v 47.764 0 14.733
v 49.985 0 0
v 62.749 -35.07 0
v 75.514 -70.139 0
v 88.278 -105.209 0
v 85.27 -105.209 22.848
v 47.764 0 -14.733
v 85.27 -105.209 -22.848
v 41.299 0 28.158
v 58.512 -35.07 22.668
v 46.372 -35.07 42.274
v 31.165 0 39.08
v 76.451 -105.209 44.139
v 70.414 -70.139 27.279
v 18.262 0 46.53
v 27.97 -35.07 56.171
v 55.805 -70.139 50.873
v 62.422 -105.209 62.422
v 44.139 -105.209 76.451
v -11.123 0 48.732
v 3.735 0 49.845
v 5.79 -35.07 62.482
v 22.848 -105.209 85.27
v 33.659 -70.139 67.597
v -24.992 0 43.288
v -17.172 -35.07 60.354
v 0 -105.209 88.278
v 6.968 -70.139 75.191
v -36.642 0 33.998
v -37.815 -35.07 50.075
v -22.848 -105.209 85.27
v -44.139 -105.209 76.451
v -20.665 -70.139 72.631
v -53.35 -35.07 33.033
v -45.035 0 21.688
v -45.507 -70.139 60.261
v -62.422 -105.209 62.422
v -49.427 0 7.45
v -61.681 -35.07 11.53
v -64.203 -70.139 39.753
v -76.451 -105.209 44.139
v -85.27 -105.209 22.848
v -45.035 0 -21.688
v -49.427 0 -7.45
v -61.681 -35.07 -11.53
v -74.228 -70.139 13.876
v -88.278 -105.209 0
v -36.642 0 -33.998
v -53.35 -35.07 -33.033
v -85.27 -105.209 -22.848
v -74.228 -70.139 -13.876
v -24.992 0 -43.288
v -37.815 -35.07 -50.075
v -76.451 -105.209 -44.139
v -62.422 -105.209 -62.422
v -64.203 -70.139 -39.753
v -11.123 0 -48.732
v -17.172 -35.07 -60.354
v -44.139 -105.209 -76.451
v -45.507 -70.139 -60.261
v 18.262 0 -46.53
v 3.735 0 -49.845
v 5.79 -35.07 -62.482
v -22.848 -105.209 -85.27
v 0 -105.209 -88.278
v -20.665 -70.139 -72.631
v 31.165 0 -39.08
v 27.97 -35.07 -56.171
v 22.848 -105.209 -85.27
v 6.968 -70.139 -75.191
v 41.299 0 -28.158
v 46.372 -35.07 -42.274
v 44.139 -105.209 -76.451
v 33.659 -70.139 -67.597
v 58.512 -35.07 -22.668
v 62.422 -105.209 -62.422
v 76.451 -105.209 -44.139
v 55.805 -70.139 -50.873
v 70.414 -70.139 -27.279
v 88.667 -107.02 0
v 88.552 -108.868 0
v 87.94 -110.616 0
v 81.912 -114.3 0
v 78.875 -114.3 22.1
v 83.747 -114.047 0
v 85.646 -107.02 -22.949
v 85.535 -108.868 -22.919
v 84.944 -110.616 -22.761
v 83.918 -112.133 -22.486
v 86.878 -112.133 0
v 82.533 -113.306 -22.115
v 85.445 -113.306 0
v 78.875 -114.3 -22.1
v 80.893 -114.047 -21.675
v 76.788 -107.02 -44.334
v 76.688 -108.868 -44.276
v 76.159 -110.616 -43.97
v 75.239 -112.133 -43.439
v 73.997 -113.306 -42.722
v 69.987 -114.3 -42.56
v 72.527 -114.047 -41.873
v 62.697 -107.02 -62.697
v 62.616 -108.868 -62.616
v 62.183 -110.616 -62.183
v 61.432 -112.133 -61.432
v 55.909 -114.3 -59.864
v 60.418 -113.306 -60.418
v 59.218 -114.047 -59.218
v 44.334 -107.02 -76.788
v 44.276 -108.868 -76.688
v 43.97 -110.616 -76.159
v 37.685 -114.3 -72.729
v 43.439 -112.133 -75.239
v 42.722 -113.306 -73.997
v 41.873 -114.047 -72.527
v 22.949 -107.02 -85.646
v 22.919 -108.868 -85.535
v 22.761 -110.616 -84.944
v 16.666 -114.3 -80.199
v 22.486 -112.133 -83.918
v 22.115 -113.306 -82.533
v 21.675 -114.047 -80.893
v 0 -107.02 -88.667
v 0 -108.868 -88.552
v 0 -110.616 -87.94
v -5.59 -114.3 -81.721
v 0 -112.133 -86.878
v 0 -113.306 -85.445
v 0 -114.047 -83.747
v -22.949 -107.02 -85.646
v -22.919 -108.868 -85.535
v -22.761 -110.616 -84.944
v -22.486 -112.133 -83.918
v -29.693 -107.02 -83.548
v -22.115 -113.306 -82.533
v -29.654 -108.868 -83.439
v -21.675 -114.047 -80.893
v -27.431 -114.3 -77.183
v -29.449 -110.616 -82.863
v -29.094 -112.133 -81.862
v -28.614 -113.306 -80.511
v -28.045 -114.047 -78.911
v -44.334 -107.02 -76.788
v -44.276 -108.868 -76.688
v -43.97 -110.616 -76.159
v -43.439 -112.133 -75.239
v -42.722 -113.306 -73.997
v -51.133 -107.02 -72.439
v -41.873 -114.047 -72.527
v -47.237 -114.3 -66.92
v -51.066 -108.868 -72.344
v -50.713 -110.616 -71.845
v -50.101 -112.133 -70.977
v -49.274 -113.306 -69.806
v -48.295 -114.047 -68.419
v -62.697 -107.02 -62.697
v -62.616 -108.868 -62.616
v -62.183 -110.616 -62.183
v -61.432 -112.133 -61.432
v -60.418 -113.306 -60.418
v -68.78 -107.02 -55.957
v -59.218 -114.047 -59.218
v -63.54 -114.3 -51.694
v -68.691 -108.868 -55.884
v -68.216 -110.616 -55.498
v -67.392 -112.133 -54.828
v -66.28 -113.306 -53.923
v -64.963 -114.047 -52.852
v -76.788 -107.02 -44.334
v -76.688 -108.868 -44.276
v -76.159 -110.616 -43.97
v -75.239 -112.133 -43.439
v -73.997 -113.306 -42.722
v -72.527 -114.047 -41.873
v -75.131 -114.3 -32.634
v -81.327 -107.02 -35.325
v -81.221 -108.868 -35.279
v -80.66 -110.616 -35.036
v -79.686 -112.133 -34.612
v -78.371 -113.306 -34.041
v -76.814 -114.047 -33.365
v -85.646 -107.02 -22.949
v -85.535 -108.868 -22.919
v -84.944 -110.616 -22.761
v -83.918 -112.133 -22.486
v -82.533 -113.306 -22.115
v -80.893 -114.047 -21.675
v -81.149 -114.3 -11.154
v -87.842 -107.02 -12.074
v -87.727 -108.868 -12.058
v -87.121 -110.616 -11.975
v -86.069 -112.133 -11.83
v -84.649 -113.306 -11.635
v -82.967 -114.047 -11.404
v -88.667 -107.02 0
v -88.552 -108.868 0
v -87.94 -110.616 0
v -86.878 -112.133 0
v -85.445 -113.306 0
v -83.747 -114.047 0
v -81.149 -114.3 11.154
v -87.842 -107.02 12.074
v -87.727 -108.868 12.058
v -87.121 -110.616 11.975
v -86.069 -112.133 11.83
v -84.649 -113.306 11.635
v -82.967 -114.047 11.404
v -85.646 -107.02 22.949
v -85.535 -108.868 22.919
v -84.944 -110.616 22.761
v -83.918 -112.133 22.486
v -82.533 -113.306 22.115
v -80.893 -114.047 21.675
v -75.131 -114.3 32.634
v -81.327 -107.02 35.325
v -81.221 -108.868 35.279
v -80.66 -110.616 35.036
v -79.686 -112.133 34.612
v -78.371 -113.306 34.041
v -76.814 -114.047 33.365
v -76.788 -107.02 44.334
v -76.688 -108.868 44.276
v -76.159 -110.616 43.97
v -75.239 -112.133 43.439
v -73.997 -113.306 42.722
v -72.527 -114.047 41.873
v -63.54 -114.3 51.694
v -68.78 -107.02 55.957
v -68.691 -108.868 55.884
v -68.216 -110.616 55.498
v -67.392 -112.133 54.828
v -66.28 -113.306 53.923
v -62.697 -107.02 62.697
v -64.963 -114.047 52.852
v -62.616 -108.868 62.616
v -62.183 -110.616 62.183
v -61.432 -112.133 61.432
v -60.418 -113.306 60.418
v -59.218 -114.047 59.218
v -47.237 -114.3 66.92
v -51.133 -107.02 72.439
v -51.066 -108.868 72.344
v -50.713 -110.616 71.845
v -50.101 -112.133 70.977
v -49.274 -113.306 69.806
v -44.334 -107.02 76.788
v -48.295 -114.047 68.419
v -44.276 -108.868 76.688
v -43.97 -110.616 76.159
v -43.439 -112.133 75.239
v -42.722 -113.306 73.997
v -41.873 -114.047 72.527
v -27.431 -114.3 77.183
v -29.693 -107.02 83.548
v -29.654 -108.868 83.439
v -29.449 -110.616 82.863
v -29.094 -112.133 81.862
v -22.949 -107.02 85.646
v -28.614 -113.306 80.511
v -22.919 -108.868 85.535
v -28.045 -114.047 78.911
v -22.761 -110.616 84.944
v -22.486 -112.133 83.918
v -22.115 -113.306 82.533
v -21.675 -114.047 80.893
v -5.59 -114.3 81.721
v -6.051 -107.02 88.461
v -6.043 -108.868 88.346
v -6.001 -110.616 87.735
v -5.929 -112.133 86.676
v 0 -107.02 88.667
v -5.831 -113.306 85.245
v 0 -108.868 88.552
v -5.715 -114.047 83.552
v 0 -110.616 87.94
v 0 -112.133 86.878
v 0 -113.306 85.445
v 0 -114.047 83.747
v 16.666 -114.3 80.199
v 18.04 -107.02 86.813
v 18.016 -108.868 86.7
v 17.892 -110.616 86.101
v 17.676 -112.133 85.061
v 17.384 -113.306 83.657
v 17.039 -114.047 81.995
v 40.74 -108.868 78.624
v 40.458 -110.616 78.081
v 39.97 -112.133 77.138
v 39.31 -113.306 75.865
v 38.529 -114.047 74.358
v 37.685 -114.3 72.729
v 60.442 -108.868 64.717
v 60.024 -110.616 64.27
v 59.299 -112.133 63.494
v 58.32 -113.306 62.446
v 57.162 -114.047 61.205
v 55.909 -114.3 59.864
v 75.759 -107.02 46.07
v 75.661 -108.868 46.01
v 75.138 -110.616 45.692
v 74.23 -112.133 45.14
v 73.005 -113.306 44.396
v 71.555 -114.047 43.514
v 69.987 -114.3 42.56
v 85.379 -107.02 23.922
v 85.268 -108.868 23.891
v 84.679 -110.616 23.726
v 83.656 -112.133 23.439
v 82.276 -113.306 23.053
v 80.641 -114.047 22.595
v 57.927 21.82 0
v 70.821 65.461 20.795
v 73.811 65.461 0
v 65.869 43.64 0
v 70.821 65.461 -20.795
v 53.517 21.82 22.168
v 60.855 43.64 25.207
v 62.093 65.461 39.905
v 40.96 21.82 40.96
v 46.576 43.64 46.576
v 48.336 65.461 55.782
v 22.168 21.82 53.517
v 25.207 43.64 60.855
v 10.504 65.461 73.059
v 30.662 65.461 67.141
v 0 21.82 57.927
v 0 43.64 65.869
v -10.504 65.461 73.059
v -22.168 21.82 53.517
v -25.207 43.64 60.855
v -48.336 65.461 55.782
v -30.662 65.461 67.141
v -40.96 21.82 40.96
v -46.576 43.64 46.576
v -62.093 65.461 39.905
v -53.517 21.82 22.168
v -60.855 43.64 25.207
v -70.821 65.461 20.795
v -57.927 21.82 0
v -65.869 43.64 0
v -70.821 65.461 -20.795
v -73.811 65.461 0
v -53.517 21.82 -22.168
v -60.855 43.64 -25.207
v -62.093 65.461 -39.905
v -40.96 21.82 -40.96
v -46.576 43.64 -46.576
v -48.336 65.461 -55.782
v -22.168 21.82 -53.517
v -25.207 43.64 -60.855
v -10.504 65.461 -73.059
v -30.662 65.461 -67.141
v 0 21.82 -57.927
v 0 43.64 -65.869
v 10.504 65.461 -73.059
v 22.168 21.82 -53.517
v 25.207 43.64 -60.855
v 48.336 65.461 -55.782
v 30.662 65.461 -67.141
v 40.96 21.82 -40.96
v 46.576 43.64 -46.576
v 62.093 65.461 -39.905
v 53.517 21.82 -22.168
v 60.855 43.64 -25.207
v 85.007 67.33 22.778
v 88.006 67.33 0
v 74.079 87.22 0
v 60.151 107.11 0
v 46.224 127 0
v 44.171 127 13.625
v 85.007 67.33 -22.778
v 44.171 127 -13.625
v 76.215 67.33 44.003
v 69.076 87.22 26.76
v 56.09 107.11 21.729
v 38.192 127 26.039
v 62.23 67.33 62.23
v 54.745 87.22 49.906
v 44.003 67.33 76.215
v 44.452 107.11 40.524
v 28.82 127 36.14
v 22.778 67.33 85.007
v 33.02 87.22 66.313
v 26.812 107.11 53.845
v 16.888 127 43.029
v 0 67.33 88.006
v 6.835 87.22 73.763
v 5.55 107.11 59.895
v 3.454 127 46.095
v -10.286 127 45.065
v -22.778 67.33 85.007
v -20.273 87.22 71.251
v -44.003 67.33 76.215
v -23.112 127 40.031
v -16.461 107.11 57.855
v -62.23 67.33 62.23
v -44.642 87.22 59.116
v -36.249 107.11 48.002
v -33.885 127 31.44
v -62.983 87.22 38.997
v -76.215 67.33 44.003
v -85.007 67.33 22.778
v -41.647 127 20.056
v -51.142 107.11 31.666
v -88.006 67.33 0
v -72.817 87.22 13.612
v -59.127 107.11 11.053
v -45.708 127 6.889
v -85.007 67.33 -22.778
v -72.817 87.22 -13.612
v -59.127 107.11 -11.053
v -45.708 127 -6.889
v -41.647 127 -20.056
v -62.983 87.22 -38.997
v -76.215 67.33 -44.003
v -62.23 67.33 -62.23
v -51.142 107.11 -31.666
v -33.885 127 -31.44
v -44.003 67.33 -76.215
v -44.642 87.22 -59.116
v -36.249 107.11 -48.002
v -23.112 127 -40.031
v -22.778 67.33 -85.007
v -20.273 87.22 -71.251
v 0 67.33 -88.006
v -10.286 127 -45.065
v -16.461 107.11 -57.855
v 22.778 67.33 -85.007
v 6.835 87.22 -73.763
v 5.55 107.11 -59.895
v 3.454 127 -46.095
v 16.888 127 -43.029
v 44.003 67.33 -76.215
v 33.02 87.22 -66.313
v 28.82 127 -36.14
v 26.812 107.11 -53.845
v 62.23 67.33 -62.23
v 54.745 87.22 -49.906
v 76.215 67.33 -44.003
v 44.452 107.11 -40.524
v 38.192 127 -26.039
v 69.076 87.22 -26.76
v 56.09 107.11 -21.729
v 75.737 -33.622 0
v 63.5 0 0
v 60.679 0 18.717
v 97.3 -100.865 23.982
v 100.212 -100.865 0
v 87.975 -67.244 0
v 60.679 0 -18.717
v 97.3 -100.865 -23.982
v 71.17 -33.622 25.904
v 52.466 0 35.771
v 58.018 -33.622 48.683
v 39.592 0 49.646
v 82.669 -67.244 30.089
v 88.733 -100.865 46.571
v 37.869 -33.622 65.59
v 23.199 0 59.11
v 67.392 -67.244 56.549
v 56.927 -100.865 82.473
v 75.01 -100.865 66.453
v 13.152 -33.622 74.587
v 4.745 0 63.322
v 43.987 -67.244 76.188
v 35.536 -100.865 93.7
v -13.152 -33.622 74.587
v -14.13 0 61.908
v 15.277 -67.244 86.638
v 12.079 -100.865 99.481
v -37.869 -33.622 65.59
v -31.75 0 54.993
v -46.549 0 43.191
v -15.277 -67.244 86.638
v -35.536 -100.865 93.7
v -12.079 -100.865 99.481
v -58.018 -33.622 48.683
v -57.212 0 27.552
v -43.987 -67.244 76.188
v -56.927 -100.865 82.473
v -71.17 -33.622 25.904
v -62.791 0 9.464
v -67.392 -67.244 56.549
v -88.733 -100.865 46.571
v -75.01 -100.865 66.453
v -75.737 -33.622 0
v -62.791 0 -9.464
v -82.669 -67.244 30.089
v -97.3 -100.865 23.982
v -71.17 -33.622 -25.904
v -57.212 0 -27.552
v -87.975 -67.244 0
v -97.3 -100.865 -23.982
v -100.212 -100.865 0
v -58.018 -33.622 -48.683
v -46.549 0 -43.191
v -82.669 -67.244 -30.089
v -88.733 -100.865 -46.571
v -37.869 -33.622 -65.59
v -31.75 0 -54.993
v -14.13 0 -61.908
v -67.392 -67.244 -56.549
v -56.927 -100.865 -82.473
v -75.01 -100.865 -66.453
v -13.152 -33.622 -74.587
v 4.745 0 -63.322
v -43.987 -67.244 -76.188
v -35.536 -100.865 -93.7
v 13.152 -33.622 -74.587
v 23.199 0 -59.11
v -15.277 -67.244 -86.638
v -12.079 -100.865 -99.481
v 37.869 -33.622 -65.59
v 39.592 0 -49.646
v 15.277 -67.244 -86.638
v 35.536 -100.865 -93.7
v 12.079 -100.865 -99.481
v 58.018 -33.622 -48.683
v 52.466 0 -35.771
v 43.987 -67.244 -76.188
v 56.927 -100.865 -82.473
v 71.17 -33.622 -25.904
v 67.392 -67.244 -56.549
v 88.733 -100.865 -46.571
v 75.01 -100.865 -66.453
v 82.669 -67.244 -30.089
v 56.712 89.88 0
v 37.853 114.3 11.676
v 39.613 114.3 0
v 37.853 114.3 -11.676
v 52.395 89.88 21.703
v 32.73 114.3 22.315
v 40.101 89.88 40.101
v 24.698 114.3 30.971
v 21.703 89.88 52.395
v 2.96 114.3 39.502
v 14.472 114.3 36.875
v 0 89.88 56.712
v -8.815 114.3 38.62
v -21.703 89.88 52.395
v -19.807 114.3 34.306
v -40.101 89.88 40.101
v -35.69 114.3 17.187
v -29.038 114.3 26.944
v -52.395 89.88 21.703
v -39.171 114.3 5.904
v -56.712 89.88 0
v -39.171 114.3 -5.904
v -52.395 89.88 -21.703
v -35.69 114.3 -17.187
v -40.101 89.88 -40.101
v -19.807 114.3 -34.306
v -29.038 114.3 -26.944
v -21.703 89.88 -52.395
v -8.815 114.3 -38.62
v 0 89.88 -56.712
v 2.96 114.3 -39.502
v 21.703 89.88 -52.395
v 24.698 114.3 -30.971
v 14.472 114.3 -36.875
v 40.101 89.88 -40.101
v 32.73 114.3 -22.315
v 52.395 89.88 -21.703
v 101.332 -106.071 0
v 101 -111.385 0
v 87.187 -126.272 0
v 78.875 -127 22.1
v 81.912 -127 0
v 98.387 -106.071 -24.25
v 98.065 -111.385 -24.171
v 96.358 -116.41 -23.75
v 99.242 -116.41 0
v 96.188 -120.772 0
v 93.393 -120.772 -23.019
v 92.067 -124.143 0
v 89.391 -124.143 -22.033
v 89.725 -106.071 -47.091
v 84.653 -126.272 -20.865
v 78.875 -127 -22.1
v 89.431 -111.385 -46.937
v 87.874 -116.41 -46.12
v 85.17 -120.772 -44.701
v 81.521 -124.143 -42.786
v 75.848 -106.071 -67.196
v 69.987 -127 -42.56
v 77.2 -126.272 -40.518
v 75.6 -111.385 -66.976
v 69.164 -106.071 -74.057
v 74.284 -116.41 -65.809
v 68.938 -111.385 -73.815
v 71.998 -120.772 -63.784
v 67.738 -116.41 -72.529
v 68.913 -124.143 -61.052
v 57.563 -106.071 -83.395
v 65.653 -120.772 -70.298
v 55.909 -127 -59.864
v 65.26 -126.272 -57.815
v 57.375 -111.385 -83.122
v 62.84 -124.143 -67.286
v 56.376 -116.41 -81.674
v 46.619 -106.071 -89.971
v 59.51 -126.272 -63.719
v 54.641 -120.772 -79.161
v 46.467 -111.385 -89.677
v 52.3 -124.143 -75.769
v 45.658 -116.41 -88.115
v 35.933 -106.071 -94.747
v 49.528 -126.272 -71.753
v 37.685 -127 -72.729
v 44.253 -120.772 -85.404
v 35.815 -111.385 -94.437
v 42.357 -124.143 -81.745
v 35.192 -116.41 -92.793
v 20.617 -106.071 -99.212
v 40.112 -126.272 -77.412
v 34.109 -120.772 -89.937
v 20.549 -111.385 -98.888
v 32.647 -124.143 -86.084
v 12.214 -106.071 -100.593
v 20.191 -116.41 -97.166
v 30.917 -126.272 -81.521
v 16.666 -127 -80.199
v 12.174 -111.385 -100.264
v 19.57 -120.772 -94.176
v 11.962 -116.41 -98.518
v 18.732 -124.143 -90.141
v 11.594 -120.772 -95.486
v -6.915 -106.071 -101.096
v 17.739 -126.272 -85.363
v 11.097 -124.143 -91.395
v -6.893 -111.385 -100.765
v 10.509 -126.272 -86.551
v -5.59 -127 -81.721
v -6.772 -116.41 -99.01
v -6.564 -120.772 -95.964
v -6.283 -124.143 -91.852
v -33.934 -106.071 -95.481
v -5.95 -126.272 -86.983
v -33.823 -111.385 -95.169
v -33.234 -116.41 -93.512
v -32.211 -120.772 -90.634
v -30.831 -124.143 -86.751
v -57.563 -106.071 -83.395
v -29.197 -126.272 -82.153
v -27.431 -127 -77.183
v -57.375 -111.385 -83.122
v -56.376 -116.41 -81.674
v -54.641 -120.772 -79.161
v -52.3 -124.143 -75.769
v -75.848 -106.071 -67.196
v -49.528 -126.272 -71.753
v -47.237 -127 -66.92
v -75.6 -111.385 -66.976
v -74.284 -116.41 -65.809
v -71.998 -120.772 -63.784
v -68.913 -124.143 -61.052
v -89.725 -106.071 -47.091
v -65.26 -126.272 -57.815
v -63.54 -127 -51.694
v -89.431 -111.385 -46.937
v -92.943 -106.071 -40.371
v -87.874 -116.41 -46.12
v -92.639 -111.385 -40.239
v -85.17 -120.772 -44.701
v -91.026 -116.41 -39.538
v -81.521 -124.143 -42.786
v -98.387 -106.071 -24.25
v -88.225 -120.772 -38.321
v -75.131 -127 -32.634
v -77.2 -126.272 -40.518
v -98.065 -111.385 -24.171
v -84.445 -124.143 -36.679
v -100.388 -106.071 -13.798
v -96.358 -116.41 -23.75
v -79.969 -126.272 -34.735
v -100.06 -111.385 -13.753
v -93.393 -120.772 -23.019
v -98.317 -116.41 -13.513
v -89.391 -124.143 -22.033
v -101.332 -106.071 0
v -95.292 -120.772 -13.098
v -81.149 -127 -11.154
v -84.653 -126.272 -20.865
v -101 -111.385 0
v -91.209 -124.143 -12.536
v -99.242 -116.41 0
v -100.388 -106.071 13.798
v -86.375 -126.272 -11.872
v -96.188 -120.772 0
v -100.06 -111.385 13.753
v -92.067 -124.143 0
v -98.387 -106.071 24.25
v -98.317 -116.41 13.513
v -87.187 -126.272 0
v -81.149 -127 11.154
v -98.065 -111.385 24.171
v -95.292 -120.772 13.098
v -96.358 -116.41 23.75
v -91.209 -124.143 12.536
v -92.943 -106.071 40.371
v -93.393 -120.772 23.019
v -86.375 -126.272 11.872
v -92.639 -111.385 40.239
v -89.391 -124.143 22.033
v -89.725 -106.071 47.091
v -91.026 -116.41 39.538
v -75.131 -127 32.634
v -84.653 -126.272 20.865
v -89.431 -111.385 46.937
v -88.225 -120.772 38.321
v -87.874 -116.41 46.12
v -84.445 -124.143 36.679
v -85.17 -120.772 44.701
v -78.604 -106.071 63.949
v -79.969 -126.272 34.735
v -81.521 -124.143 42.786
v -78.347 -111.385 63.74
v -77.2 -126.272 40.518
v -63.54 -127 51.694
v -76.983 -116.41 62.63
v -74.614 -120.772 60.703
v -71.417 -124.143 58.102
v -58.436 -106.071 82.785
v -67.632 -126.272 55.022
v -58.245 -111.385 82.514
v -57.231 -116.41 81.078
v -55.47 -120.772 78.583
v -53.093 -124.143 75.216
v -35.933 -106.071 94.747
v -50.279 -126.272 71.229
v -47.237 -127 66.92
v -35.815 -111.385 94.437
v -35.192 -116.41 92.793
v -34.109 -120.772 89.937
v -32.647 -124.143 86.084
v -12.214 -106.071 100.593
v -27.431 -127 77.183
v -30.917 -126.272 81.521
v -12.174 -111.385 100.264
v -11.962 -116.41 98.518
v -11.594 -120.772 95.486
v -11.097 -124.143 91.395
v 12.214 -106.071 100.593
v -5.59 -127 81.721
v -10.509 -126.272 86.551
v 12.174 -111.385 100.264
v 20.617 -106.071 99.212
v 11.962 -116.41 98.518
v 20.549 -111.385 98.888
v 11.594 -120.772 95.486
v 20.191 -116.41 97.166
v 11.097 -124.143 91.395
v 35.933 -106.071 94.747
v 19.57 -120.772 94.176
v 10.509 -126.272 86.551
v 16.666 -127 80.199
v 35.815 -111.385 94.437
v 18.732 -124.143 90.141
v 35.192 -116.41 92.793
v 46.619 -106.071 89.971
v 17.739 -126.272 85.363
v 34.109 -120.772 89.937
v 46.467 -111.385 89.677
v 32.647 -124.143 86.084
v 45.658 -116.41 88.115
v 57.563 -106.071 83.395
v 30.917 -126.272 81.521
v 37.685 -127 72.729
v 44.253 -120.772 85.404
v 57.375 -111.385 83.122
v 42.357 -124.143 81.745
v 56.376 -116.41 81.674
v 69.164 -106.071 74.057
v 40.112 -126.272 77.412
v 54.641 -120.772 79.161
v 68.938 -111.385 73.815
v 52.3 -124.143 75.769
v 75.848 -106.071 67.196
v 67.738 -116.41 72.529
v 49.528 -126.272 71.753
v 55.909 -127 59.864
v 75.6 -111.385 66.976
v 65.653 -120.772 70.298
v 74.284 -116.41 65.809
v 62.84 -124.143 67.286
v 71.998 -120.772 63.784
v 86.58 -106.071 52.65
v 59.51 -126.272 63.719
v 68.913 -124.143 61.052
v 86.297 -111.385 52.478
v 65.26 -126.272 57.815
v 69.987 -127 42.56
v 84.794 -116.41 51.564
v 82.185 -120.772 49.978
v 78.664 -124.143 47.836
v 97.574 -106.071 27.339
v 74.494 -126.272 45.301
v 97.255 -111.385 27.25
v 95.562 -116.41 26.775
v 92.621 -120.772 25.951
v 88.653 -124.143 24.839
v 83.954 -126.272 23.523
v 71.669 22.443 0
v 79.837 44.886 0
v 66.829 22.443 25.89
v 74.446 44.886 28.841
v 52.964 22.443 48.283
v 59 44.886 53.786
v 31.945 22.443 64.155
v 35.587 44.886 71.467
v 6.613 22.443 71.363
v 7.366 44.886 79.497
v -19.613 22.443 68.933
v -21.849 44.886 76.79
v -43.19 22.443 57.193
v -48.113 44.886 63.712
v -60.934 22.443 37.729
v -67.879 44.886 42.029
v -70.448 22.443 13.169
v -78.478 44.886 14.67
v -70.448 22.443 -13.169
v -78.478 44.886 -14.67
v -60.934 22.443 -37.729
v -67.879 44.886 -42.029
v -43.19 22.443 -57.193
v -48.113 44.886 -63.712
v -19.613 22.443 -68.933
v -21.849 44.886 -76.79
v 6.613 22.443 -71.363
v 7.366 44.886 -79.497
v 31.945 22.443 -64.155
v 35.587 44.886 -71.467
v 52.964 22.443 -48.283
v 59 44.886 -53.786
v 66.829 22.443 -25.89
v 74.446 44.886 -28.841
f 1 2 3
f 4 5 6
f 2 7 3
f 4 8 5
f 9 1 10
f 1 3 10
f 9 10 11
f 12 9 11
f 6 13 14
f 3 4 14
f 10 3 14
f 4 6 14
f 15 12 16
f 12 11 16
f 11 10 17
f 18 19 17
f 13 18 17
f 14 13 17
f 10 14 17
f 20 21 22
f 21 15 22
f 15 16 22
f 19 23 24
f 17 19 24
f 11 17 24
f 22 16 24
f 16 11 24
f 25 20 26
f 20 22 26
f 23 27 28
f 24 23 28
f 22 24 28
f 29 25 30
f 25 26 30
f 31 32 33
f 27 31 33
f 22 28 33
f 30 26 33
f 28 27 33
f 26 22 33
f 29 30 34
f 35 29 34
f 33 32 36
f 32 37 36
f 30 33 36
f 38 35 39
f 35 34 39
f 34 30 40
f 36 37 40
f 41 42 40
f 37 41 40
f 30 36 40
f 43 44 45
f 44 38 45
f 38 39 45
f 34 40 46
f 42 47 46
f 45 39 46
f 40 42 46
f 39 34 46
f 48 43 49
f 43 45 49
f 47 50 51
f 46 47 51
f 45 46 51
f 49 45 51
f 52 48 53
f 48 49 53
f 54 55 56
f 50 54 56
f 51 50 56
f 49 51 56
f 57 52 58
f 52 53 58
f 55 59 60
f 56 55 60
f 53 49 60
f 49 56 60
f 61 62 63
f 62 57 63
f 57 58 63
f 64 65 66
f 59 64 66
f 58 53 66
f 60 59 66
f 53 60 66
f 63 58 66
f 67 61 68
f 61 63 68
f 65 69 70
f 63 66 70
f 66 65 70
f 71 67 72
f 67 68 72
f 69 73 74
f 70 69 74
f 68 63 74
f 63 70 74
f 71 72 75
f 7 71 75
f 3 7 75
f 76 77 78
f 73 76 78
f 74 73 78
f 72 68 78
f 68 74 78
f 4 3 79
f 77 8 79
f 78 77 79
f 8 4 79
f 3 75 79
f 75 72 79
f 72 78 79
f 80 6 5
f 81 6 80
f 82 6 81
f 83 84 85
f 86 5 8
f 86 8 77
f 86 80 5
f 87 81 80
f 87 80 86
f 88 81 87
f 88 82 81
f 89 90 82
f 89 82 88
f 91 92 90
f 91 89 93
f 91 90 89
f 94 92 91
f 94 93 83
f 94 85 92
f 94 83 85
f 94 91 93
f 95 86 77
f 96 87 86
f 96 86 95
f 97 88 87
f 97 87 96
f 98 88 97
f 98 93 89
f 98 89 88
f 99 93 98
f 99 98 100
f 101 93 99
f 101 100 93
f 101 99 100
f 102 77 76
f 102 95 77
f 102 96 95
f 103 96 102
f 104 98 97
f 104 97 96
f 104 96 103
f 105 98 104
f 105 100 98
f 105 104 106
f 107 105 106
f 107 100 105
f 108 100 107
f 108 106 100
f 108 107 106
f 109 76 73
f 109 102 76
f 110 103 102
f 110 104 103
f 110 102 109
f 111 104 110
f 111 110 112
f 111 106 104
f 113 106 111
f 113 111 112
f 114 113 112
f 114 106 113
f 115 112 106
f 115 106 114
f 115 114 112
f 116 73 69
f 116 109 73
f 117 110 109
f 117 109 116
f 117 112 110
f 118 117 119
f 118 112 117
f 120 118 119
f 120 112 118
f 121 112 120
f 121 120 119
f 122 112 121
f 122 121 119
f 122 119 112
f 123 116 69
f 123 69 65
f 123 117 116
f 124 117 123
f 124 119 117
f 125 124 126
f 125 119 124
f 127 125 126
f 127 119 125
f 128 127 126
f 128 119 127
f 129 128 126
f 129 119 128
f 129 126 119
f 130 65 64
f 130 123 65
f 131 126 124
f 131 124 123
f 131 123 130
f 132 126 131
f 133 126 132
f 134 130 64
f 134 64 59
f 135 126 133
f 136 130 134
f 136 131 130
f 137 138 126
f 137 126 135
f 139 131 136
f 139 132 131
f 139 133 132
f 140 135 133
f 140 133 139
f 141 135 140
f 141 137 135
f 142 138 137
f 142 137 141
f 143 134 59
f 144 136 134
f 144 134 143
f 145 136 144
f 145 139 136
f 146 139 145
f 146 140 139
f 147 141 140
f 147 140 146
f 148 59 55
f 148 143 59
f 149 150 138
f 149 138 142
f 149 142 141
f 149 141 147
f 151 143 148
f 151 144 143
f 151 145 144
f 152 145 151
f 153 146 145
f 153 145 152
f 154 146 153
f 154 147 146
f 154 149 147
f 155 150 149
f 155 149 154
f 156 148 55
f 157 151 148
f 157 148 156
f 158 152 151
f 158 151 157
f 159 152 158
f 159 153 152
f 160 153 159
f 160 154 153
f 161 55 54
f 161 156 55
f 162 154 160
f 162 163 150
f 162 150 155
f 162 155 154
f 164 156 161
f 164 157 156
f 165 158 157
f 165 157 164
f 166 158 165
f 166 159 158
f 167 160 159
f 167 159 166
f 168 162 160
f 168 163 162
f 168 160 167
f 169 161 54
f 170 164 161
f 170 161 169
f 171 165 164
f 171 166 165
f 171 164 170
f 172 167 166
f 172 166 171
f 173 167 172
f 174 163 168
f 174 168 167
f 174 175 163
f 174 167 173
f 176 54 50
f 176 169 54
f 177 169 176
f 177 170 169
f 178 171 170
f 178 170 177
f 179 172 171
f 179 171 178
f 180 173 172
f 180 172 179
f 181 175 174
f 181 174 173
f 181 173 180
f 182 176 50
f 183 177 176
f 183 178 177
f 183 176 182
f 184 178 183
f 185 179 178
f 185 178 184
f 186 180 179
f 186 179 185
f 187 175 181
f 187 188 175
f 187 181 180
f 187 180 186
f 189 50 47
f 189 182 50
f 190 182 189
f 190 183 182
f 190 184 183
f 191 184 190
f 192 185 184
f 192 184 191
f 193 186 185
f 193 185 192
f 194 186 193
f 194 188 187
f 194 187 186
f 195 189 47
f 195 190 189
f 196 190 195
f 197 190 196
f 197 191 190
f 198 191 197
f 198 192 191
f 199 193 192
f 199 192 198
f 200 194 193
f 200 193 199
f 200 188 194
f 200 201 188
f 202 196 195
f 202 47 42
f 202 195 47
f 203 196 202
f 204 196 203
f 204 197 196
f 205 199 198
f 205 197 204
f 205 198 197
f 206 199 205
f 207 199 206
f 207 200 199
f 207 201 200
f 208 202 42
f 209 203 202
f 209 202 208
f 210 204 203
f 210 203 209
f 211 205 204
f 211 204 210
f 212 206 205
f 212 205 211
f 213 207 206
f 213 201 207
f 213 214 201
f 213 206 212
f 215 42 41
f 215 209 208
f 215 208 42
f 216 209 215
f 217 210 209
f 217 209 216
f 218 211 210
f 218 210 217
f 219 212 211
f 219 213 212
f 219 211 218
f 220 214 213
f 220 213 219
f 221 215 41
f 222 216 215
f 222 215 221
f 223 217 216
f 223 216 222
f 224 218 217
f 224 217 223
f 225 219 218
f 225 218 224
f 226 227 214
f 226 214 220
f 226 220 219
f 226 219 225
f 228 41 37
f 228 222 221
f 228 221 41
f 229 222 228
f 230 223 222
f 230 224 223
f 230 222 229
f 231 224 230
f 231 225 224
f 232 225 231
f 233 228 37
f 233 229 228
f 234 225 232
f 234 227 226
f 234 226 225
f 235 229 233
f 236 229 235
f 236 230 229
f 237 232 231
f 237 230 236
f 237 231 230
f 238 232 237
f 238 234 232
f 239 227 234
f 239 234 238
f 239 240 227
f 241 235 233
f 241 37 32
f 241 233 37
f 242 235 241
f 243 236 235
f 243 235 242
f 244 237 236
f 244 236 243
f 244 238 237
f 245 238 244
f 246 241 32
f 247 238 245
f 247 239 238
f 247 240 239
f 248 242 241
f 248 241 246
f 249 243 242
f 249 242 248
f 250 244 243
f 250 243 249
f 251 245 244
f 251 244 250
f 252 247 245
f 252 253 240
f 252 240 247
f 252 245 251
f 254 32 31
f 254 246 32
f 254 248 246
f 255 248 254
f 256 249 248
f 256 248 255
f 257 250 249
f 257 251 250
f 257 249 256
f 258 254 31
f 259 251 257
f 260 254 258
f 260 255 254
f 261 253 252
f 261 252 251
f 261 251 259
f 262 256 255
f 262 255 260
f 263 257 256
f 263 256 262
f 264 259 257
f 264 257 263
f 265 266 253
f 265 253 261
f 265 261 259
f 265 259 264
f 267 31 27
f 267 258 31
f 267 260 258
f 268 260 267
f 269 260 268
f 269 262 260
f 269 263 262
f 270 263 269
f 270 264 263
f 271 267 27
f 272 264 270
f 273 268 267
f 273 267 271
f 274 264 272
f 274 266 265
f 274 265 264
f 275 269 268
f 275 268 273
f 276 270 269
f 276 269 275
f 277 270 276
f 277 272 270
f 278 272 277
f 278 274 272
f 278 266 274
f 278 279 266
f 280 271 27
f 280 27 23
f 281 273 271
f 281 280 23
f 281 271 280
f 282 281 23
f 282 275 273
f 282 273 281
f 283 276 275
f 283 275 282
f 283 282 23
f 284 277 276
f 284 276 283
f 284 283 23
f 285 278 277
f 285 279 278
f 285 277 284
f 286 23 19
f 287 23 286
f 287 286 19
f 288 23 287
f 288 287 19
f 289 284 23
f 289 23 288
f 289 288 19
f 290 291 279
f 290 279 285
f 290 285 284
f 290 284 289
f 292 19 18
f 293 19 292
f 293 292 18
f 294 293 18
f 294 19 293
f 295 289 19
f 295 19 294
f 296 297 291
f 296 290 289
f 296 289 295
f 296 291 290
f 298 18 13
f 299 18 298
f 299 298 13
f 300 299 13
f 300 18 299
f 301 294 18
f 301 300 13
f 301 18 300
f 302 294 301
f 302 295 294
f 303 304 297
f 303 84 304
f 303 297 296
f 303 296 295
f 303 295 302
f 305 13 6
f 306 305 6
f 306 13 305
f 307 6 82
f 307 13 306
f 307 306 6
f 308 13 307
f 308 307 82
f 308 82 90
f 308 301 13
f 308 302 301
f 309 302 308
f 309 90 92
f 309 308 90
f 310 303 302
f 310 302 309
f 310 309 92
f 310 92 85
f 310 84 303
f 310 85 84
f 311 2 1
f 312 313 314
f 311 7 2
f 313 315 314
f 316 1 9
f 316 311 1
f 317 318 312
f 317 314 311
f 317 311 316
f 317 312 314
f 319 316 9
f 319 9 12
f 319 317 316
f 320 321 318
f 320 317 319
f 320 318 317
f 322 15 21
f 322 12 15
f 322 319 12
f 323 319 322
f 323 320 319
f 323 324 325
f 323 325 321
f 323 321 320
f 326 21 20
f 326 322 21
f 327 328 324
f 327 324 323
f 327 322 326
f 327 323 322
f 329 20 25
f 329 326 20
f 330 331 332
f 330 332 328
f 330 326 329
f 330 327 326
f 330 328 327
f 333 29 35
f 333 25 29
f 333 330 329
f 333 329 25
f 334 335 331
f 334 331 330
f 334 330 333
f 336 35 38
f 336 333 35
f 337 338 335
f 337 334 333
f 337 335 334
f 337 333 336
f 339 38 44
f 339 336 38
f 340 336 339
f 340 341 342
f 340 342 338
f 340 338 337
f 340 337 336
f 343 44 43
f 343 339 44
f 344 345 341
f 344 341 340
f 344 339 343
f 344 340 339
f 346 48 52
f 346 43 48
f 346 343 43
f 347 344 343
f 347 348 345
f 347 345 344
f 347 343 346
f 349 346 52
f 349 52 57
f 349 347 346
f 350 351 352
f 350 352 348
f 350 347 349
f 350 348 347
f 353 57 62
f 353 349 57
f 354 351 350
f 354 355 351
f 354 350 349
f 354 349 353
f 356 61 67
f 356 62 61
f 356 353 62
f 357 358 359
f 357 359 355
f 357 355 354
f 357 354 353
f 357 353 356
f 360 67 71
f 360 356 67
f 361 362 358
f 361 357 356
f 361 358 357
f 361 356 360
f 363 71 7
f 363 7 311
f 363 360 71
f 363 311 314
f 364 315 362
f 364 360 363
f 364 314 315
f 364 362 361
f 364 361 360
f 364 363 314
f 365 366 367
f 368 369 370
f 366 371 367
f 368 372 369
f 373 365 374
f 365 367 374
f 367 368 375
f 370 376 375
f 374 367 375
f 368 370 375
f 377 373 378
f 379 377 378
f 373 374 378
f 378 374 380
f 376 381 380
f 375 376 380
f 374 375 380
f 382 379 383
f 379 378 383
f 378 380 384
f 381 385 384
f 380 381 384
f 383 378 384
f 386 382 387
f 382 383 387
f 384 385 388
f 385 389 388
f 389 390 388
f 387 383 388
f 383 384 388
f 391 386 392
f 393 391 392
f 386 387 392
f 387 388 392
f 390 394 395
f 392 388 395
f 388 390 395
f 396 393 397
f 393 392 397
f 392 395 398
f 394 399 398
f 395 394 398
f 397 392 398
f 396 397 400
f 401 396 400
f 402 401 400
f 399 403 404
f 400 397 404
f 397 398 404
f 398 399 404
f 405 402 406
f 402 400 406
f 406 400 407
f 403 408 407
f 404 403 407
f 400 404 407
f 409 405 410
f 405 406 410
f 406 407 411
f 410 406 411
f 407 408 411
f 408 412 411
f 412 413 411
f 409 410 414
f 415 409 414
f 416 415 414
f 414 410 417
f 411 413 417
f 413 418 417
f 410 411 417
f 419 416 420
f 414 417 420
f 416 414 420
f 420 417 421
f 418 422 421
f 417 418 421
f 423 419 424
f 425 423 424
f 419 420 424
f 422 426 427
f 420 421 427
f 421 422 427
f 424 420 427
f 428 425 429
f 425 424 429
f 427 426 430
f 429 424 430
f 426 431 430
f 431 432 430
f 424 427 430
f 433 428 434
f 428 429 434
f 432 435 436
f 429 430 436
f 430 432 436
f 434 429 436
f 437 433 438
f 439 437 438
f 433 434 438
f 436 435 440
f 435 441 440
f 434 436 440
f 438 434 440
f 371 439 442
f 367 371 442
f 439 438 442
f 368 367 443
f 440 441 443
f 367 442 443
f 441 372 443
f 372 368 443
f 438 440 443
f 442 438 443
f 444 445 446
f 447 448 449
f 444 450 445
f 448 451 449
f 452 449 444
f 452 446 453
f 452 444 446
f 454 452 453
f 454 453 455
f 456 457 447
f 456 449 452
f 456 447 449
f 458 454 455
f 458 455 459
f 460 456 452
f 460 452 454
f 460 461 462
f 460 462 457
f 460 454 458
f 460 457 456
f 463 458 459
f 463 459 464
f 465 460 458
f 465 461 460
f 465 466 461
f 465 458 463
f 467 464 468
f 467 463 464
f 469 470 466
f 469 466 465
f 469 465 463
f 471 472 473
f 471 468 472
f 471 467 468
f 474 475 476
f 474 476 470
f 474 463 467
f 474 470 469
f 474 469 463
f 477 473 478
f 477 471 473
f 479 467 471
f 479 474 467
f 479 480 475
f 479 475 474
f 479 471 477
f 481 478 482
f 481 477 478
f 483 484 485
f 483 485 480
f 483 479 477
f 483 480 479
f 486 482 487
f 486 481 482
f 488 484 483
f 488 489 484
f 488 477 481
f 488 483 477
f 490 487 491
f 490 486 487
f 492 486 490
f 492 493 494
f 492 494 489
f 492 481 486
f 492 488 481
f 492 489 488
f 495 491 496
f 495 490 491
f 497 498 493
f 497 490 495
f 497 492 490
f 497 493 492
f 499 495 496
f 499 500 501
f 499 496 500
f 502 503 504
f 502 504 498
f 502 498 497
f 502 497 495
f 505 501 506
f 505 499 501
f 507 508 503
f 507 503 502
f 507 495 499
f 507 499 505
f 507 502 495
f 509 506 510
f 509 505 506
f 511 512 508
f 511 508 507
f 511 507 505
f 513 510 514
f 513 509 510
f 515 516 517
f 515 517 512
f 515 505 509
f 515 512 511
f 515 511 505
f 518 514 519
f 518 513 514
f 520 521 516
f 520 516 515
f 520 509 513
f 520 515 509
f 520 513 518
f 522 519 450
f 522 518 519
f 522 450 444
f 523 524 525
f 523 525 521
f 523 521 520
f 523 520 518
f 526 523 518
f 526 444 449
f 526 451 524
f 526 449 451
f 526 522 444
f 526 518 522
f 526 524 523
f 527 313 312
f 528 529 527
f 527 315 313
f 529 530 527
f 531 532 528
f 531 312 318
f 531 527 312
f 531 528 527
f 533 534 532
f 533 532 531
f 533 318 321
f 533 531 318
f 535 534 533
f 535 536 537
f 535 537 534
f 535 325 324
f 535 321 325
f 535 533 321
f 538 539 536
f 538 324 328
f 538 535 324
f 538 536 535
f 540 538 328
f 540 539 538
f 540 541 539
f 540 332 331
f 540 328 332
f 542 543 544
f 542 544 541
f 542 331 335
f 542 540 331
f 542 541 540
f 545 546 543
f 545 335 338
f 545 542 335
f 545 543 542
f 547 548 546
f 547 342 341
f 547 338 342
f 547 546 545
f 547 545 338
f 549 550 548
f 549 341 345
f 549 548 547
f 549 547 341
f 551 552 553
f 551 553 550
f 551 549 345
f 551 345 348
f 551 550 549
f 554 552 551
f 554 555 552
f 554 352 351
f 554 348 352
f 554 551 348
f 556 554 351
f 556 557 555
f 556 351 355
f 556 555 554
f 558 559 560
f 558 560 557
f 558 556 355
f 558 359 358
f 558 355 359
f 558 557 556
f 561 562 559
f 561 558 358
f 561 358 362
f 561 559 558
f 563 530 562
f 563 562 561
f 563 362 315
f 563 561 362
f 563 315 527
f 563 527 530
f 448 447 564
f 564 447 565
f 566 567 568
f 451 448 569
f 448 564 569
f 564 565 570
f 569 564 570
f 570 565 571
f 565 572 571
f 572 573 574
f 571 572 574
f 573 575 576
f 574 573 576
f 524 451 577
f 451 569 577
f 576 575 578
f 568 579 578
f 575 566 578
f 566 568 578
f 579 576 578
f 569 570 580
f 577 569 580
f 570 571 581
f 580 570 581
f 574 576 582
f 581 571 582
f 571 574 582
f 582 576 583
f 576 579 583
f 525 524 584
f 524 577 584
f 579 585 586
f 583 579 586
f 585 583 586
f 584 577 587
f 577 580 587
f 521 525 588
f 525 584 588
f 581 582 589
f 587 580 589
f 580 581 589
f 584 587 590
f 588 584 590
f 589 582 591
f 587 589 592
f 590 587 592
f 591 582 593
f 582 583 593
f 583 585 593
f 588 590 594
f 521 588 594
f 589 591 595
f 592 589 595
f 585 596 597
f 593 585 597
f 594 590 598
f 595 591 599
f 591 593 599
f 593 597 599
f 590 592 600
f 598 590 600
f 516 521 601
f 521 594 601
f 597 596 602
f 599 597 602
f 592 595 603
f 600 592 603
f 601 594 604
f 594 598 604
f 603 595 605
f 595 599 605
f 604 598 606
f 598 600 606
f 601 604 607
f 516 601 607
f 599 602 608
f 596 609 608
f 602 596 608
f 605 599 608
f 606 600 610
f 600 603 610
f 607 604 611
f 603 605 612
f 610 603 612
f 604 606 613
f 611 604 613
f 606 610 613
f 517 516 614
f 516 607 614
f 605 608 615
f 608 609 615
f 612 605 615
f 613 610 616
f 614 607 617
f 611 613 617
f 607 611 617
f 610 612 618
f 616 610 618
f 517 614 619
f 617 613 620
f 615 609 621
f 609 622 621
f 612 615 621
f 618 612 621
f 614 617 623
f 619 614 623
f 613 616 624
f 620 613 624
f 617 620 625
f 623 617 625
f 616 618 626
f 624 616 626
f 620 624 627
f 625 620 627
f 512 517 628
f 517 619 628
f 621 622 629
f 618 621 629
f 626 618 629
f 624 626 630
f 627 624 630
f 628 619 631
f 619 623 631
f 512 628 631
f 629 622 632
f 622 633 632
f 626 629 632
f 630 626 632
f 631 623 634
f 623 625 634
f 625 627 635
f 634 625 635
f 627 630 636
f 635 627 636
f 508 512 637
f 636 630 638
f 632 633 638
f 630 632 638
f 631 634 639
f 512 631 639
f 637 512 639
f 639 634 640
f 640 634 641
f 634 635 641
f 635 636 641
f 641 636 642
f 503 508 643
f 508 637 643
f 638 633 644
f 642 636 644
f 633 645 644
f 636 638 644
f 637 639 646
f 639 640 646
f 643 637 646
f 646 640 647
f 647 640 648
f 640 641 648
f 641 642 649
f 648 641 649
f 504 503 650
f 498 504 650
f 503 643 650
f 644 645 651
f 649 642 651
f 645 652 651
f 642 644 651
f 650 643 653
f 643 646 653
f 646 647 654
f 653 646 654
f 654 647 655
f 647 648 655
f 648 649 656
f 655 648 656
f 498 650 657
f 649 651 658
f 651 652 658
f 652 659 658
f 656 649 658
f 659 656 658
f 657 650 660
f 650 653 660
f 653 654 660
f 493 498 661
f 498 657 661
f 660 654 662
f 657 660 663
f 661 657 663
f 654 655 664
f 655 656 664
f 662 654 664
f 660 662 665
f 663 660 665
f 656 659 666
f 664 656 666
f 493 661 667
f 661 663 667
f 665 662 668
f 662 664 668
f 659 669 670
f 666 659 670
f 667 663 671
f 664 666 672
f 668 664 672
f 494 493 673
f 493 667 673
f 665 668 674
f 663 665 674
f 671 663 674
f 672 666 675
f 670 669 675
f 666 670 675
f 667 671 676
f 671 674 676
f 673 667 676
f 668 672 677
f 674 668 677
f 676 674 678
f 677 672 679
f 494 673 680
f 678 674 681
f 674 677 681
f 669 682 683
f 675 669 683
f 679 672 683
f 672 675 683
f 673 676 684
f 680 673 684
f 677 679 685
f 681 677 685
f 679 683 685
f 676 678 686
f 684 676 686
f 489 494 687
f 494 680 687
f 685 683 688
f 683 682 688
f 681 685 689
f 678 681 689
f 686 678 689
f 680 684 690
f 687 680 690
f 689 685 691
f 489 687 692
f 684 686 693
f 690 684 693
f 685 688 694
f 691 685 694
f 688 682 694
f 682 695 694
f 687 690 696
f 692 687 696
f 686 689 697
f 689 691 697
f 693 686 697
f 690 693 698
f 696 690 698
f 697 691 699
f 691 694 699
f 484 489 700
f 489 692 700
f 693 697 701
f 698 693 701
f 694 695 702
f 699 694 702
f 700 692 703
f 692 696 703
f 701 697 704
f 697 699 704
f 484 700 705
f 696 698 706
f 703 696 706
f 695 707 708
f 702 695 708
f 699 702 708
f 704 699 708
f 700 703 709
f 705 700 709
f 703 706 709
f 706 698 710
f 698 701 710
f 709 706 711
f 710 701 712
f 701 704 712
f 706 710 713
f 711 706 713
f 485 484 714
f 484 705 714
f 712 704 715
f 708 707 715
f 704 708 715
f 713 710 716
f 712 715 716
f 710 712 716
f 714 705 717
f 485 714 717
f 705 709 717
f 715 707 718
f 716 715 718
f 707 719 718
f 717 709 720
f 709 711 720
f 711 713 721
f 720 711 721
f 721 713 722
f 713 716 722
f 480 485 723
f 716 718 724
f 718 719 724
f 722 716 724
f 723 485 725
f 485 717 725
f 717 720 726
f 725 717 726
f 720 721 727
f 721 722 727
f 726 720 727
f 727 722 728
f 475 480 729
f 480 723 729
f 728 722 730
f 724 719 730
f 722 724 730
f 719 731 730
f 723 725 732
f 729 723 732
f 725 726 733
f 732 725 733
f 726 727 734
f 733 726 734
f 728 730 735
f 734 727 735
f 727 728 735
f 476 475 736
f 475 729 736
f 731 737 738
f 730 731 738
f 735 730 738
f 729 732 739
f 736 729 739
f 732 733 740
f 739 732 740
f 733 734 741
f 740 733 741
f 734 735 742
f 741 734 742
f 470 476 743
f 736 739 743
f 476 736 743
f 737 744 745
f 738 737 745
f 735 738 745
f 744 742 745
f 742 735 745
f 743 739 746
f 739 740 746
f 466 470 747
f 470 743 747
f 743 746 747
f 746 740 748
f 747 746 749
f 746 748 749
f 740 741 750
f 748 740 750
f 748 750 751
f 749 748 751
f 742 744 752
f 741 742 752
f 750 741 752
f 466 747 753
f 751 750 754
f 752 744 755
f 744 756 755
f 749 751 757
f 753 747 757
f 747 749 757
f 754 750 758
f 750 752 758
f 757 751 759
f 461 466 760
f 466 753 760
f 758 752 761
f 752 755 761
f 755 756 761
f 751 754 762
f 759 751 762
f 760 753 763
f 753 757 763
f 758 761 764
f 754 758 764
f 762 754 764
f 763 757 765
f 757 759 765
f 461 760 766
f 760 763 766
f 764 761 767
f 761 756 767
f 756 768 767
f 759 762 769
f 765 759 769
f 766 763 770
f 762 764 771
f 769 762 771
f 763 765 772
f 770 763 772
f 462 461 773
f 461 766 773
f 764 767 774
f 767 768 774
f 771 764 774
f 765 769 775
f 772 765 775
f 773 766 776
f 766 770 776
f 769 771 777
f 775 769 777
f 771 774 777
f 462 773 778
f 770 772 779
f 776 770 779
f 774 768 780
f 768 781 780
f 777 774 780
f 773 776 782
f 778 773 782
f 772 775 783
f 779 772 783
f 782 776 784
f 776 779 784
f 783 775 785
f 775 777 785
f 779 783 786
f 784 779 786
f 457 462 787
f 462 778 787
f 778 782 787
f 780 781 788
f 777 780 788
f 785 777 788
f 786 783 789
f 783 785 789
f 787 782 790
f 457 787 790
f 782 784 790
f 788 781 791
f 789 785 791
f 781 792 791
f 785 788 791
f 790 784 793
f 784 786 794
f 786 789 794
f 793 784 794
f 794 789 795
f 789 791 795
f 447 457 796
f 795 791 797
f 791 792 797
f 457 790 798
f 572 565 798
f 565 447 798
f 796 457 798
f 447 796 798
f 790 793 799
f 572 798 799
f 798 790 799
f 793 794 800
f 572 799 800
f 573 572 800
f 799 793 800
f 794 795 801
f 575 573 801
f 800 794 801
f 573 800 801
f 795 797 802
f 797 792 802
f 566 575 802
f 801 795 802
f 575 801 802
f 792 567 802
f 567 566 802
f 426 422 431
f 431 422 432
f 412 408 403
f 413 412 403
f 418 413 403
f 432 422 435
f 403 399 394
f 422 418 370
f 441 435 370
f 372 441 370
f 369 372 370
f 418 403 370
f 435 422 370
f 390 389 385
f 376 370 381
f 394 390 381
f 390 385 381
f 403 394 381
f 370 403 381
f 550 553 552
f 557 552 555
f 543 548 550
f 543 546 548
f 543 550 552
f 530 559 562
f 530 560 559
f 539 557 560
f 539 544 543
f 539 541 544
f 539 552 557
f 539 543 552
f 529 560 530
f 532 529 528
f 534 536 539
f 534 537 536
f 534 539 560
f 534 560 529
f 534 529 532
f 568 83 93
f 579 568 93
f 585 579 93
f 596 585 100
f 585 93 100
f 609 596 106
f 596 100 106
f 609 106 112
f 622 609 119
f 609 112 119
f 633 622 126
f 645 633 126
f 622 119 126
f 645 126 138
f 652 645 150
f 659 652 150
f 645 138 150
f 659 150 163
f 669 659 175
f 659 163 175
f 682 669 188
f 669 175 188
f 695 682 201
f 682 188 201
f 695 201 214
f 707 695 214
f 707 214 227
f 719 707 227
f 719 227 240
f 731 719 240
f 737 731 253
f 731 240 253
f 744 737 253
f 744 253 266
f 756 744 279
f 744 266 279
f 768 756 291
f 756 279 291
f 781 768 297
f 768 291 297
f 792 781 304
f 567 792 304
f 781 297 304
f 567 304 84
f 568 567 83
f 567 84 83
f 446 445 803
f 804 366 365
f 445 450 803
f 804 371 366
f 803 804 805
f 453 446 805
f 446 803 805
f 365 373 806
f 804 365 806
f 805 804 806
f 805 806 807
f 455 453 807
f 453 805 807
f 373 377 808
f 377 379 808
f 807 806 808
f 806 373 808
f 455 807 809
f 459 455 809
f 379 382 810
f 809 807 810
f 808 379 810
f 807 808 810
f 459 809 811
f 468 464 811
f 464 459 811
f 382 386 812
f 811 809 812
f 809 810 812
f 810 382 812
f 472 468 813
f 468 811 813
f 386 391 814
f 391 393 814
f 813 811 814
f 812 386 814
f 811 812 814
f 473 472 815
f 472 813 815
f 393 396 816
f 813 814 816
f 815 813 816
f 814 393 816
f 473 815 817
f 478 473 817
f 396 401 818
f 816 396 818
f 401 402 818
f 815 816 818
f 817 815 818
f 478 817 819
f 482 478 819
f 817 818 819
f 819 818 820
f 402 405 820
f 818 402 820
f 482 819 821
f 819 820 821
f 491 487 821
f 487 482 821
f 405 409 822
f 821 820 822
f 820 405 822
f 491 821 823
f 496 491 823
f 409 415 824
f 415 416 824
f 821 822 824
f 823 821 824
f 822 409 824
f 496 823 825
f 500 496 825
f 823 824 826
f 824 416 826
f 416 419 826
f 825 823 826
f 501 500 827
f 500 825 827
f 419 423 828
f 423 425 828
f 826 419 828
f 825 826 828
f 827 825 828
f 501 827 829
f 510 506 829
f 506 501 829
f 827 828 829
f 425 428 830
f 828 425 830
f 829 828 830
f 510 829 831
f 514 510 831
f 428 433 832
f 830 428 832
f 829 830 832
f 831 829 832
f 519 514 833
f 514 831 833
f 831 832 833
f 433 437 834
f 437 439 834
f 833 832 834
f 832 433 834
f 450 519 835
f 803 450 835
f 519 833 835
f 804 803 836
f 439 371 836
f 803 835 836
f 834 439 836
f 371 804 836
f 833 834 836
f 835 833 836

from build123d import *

# Parameters (mm, degrees)
F0_R     = 63.5
F1_DEPTH = 127
F1_TAPER = -20
F2_R     = 19.4741575124
F3_SIZE  = 63.5
F4_T     = -12.7


# Not quite as in the source:
# - a shell that OpenCascade refuses in one call is made with other operations: the cavity is built on its own and cut out


with BuildPart() as f1:
    # F0 (on Front) → F1 (new body, symmetric)
    with BuildSketch(Plane.XZ):
        Circle(F0_R)
    extrude(amount=F1_DEPTH, both=True, taper=F1_TAPER)

    # F2
    f2_edges = [f1.edges().sort_by_distance(p)[0] for p in [
        (-109.72422, -127, 0),
    ]]
    fillet(f2_edges, radius=F2_R)

    # F3
    f3_edges = [f1.edges().sort_by_distance(p)[0] for p in [
        (-109.72422, 127, 0),
    ]]
    chamfer(f3_edges, length=F3_SIZE)

    # F4: a shell. OpenCascade refuses it in one call, so the cavity is built on its own and cut out:
    # the body offset inwards by the wall thickness, plus a prism from it out through each open face.
    f4_core = offset(f1.part, amount=F4_T, kind=Kind.INTERSECTION, mode=Mode.PRIVATE)
    f4_exits = [f4_core.faces().sort_by_distance(p)[0] for p in [
        (0, -114.3, 0),
    ]]
    add(f4_core, mode=Mode.SUBTRACT)
    extrude(f4_exits, amount=-F4_T, mode=Mode.SUBTRACT)


solid = f1.part
